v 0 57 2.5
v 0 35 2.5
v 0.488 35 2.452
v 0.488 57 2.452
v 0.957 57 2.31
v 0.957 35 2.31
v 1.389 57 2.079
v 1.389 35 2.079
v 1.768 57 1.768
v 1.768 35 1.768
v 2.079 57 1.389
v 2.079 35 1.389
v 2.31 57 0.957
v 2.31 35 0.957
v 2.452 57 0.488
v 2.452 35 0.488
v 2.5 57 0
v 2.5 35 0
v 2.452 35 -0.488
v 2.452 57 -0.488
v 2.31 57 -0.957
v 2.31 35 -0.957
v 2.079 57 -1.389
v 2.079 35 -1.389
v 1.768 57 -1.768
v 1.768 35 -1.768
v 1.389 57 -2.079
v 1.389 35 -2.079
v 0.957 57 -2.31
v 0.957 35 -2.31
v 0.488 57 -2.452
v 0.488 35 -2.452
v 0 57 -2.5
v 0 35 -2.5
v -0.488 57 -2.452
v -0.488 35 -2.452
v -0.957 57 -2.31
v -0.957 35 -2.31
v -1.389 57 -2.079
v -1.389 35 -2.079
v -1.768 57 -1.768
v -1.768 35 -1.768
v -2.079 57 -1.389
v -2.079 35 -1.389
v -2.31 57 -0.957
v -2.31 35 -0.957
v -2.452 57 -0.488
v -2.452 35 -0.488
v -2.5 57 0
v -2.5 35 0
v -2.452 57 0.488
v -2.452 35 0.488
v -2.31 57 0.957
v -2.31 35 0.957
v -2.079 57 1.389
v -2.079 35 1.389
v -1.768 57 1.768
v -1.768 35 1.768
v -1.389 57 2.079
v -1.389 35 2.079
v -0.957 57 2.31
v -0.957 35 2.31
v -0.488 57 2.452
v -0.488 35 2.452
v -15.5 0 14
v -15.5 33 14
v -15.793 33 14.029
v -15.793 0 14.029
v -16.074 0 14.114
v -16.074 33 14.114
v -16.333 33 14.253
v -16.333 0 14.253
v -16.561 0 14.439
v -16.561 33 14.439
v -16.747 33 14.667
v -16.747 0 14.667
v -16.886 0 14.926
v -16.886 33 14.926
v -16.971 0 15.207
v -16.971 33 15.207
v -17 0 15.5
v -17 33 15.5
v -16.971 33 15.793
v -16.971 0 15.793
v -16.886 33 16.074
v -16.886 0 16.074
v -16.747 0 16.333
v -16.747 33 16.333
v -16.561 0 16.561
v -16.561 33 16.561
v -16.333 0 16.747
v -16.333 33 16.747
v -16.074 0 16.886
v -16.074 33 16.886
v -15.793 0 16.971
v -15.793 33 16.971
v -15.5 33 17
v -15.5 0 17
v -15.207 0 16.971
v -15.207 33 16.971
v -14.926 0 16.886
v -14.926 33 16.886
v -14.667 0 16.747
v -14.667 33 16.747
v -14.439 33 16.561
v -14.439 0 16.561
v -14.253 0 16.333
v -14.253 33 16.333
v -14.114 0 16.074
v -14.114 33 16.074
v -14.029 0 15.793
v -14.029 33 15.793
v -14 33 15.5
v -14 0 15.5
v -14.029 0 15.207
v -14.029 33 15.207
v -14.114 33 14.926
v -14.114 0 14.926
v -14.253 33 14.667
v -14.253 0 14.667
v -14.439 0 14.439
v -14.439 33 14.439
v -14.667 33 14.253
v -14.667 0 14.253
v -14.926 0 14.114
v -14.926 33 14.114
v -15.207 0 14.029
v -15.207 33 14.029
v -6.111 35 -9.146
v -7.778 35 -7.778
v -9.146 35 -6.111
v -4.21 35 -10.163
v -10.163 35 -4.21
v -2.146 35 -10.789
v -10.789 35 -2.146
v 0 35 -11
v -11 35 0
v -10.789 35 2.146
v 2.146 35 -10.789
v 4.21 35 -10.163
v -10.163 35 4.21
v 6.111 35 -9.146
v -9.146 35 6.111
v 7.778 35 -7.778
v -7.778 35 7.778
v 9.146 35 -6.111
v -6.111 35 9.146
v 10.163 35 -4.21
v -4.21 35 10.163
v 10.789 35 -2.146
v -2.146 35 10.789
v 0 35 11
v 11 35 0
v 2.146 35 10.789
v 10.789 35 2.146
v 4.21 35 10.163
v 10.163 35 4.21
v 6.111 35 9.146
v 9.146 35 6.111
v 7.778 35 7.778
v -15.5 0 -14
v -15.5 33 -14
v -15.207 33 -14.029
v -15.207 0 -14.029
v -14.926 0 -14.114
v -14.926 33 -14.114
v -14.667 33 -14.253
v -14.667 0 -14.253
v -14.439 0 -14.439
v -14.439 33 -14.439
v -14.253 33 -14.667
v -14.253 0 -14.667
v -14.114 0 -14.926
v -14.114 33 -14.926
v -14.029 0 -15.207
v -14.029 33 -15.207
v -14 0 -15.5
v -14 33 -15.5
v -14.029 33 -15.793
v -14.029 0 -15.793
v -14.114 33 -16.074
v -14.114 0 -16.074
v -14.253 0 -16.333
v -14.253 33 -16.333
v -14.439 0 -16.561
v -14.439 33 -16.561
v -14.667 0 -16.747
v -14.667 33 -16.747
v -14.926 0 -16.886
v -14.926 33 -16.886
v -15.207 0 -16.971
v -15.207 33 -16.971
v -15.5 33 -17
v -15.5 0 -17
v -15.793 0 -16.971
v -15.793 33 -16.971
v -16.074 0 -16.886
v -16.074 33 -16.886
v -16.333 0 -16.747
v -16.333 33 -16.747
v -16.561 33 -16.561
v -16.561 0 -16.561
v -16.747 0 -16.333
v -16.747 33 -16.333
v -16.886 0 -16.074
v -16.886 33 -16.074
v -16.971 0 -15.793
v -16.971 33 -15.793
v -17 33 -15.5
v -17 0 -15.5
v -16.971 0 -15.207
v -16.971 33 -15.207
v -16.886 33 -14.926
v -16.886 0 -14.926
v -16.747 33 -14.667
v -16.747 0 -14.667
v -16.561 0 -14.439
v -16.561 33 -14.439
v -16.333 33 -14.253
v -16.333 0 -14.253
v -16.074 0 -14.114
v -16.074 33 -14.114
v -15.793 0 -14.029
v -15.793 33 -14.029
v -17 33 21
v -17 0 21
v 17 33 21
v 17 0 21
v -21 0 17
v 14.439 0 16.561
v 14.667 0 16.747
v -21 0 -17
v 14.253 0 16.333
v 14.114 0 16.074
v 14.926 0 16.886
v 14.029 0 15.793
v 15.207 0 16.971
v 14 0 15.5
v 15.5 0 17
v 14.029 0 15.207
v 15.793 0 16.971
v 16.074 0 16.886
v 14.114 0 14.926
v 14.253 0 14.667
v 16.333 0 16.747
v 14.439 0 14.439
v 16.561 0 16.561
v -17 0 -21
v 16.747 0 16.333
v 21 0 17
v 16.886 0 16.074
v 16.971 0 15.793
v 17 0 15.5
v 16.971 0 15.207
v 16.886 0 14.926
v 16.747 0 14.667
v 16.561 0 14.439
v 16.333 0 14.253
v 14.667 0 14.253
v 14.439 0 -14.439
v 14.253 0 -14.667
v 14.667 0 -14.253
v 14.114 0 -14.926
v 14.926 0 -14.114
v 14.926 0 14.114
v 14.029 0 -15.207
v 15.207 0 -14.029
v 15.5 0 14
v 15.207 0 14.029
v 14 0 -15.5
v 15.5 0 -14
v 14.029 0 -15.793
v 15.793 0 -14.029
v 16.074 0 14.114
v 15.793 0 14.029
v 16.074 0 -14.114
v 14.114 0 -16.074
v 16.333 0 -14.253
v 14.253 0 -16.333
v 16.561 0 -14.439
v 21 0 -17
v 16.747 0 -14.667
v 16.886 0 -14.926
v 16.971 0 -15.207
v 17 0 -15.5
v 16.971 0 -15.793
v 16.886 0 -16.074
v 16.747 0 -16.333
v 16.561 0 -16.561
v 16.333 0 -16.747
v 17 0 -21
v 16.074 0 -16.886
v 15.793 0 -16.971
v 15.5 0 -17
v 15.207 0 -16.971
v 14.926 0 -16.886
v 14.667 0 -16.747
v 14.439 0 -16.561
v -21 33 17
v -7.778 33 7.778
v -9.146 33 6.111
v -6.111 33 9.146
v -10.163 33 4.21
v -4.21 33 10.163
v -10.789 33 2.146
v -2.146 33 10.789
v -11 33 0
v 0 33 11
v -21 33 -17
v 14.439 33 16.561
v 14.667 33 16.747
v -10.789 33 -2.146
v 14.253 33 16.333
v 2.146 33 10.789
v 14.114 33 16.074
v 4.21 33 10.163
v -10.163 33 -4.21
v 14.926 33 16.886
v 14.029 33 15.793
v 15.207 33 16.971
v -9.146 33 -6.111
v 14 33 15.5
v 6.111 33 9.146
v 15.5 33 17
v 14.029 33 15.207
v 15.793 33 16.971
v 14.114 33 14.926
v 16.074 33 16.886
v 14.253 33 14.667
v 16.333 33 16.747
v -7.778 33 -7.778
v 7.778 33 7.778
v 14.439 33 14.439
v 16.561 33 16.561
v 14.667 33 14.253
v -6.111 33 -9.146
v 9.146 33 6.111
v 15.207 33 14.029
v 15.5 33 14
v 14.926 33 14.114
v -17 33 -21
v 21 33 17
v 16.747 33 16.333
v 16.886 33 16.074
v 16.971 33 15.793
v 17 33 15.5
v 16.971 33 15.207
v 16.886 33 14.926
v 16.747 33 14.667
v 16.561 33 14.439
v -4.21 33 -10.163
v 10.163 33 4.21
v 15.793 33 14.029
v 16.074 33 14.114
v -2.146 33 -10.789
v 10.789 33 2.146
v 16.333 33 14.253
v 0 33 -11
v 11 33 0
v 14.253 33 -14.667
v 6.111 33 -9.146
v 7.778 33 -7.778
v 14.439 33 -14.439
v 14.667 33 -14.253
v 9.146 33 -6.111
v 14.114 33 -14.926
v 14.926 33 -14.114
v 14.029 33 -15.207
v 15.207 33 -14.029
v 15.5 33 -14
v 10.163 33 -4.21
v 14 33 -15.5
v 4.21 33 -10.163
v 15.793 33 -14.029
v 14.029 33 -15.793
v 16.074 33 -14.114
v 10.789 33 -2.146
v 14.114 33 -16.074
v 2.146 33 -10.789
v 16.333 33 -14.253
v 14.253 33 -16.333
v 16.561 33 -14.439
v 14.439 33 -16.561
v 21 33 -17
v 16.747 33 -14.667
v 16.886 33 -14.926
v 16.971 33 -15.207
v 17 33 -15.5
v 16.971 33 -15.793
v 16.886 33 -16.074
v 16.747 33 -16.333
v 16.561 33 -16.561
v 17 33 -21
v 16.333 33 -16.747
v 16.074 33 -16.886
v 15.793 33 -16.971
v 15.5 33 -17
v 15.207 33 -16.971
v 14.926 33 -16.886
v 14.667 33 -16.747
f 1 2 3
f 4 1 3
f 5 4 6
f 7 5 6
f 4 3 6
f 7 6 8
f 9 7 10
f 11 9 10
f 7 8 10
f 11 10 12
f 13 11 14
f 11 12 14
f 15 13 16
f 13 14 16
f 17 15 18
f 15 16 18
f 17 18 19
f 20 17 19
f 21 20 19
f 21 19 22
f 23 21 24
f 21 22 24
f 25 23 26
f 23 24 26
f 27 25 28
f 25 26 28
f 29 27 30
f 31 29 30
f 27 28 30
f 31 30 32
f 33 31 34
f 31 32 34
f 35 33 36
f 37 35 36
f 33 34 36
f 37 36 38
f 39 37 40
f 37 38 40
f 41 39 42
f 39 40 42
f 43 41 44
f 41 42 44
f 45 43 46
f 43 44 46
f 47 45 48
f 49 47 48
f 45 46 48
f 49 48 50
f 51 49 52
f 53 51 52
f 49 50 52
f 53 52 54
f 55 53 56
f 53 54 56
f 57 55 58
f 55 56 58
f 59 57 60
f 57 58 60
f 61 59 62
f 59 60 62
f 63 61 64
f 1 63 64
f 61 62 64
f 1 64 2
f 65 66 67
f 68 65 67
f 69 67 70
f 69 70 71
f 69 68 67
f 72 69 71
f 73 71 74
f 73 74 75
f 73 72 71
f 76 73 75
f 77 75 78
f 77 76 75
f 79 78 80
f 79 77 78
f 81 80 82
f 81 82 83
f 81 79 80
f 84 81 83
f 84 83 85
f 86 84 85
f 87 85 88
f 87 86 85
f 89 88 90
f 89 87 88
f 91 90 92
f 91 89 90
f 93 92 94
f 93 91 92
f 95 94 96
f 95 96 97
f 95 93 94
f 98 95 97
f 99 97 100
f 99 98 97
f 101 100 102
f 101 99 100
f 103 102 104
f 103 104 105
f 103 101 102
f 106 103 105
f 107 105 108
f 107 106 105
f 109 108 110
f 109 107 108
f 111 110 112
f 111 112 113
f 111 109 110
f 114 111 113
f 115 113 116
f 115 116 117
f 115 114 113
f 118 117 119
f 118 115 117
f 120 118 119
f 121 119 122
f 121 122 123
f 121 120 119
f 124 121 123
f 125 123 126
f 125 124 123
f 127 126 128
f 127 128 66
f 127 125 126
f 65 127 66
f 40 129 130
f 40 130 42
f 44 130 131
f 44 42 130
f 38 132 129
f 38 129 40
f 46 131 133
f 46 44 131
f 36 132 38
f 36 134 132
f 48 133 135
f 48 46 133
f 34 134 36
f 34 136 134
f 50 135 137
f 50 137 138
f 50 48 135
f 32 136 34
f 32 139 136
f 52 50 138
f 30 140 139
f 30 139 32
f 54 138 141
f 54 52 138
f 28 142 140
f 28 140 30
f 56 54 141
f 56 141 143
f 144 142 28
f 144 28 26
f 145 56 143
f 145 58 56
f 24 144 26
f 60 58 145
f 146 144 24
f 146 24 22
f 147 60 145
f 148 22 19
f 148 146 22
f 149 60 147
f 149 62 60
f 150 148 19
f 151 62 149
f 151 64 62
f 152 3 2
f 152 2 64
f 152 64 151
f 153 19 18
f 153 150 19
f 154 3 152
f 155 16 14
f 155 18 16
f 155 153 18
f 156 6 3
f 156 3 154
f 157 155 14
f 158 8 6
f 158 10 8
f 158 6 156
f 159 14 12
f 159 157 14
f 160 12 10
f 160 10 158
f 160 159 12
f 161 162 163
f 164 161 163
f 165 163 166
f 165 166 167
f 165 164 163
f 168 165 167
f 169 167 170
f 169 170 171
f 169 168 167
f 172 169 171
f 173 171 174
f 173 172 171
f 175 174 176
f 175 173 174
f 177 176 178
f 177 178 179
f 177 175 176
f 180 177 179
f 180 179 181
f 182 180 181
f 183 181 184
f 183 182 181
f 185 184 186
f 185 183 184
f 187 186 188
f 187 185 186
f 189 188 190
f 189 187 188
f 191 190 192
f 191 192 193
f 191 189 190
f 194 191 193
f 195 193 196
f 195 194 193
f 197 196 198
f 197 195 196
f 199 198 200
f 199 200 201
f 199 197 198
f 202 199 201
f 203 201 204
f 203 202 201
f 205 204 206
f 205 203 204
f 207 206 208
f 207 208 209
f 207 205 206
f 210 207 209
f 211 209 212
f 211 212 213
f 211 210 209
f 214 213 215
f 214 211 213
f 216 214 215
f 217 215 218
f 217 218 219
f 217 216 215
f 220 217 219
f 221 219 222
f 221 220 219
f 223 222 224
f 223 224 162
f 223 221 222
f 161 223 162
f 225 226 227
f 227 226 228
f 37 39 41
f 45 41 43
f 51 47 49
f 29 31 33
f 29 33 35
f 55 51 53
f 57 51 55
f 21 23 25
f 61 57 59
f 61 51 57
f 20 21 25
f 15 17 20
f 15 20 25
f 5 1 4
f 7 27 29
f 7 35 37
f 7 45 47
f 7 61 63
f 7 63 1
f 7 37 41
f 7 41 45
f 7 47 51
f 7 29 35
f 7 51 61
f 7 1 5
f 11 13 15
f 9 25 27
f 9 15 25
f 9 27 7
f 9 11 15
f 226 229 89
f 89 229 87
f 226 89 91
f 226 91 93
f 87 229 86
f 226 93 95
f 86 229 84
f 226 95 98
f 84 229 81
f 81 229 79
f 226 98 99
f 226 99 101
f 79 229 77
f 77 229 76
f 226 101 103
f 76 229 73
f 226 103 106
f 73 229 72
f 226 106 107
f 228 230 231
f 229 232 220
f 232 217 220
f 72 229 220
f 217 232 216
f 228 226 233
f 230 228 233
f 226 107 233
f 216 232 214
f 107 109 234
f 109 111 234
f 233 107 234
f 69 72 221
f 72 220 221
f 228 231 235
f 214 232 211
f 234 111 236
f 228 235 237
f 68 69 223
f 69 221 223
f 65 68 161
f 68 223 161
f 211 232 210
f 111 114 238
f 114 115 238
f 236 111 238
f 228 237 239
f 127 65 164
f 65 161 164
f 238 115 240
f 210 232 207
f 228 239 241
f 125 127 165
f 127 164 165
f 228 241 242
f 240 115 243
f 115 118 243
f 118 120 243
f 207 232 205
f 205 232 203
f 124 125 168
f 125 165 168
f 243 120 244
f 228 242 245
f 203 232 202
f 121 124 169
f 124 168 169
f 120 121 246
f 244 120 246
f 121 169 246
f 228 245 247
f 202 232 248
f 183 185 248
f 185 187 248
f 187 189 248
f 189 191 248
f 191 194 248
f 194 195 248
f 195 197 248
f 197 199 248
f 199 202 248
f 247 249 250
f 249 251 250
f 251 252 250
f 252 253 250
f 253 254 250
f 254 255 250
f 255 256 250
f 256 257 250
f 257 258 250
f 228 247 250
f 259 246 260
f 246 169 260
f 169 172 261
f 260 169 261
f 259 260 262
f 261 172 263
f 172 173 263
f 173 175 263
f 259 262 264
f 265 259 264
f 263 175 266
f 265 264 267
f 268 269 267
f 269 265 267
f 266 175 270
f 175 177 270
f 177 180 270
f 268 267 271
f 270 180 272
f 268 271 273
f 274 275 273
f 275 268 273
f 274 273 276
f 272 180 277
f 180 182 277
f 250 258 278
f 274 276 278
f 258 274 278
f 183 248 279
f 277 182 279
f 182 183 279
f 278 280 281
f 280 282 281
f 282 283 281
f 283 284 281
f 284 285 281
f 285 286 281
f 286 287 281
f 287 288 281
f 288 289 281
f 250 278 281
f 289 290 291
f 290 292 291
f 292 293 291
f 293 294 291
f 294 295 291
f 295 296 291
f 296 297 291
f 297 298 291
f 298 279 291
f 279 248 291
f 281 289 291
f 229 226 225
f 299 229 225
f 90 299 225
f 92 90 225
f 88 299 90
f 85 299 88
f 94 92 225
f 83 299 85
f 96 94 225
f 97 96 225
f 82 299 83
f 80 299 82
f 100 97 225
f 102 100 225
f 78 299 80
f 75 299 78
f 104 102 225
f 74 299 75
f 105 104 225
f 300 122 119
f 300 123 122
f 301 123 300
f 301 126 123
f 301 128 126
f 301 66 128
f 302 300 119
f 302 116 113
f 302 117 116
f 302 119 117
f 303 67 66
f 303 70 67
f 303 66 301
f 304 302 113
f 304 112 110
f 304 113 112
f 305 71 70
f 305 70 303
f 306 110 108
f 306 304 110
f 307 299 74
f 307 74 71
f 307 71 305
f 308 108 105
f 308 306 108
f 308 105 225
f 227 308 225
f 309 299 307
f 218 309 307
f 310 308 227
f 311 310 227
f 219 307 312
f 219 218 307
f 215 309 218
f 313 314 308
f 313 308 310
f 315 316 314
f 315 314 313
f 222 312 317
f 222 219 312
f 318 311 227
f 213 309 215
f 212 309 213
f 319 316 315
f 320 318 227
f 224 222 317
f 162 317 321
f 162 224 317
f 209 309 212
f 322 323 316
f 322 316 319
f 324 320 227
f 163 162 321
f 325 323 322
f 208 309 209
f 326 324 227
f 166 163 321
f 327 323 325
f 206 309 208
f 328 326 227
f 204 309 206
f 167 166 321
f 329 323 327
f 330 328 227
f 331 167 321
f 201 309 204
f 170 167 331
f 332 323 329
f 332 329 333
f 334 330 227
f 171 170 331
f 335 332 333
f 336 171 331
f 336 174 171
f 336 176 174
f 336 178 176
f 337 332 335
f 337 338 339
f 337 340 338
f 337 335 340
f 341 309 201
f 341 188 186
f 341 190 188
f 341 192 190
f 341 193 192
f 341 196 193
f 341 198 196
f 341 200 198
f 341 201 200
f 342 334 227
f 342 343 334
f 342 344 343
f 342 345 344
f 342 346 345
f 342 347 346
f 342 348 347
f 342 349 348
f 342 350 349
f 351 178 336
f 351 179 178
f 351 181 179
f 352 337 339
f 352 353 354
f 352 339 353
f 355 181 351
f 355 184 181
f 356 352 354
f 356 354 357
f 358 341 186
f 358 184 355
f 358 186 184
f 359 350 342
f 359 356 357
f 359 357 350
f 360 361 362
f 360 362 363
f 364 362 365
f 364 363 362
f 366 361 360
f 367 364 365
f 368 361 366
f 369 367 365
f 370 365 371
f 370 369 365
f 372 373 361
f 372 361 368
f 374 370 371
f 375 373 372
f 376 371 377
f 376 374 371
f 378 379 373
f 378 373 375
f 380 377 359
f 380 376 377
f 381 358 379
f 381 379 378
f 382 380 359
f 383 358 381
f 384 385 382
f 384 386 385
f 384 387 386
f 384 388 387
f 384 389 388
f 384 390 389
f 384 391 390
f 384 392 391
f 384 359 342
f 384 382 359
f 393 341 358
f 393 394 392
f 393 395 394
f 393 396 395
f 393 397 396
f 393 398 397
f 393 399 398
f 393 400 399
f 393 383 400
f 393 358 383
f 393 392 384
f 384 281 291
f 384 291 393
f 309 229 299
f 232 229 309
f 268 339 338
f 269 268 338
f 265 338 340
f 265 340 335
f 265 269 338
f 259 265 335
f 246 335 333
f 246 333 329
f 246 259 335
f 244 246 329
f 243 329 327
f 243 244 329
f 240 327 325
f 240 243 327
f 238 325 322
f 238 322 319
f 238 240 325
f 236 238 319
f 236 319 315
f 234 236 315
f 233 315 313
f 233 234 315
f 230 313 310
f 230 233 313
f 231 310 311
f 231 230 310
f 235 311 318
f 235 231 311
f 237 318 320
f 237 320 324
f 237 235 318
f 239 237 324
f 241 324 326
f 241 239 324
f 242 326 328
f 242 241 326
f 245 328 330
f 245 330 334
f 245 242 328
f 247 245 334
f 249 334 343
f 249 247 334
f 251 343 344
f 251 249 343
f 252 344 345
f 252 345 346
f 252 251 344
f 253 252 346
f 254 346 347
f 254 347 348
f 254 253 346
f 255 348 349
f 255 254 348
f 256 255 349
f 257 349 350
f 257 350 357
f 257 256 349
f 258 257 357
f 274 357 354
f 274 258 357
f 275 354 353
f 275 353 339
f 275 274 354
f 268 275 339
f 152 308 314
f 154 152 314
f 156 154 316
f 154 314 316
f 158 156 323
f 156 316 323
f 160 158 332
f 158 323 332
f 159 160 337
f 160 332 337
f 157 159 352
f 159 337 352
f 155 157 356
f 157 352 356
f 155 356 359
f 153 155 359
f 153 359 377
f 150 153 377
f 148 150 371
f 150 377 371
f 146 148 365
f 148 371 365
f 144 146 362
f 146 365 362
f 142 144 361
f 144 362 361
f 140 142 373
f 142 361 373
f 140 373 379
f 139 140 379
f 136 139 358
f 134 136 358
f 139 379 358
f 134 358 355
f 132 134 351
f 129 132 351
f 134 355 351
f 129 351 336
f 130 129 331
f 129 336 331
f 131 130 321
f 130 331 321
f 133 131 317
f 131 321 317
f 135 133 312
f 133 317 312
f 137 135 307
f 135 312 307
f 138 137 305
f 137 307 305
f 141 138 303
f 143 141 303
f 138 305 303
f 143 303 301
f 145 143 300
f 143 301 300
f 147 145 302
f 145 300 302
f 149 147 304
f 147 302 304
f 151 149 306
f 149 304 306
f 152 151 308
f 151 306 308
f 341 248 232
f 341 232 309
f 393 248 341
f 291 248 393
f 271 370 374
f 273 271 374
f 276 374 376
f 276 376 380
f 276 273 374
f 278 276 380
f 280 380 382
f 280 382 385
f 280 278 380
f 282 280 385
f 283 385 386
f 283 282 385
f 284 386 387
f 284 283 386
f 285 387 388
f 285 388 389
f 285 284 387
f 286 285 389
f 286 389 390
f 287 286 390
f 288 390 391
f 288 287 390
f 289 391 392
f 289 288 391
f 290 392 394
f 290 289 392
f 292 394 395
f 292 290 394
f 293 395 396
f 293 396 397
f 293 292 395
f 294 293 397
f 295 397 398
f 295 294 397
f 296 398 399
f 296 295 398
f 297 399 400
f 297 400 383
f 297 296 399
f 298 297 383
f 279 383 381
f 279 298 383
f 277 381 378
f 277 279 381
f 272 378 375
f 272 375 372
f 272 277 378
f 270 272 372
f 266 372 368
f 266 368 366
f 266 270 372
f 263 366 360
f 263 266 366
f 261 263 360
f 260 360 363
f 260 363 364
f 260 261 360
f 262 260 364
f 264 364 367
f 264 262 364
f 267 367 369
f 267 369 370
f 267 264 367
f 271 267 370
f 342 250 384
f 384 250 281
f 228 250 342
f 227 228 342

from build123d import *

# Parameters (mm, degrees)
SKETCH1_W           = 42
SKETCH1_H           = 42
SKETCH1_R           = 1.5
BOSS_EXTRUDE1_DEPTH = 33
CHAMFER1_SIZE       = 4
SKETCH2_R           = 11
BOSS_EXTRUDE2_DEPTH = 2
SKETCH3_R           = 2.5
BOSS_EXTRUDE3_DEPTH = 22


with BuildPart() as part:
    # Sketch1 → Boss-Extrude1 (new body)
    with BuildSketch(Plane(origin=(0, 0, 0), x_dir=(1, 0, 0), z_dir=(0, 1, 0))):
        Rectangle(SKETCH1_W, SKETCH1_H)
        with Locations(Location((15.5, 15.5, 0), (0, 0, 270))):
            Circle(SKETCH1_R, mode=Mode.SUBTRACT)
        with Locations(Location((-15.5, 15.5, 0), (0, 0, 270))):
            Circle(SKETCH1_R, mode=Mode.SUBTRACT)
        with Locations(Location((15.5, -15.5, 0), (0, 0, 90))):
            Circle(SKETCH1_R, mode=Mode.SUBTRACT)
        with Locations(Location((-15.5, -15.5, 0), (0, 0, 90))):
            Circle(SKETCH1_R, mode=Mode.SUBTRACT)
    extrude(amount=BOSS_EXTRUDE1_DEPTH)

    # Chamfer1
    chamfer1_edges = [part.edges().sort_by_distance(p)[0] for p in [
        (21, 16.5, 21),
        (-21, 16.5, 21),
        (-21, 16.5, -21),
        (21, 16.5, -21),
    ]]
    chamfer(chamfer1_edges, length=CHAMFER1_SIZE)

    # Sketch2 → Boss-Extrude2 (add)
    with BuildSketch(Plane(origin=(0, 33, 0), x_dir=(1, 0, 0), z_dir=(0, 1, 0))):
        with Locations(Location((0, 0, 0), (0, 0, 270))):
            Circle(SKETCH2_R)
    extrude(amount=BOSS_EXTRUDE2_DEPTH)

    # Sketch3 → Boss-Extrude3 (add)
    with BuildSketch(Plane(origin=(0, 35, 0), x_dir=(1, 0, 0), z_dir=(0, 1, 0))):
        with Locations(Location((0, 0, 0), (0, 0, 270))):
            Circle(SKETCH3_R)
    extrude(amount=BOSS_EXTRUDE3_DEPTH)


solid = part.part
